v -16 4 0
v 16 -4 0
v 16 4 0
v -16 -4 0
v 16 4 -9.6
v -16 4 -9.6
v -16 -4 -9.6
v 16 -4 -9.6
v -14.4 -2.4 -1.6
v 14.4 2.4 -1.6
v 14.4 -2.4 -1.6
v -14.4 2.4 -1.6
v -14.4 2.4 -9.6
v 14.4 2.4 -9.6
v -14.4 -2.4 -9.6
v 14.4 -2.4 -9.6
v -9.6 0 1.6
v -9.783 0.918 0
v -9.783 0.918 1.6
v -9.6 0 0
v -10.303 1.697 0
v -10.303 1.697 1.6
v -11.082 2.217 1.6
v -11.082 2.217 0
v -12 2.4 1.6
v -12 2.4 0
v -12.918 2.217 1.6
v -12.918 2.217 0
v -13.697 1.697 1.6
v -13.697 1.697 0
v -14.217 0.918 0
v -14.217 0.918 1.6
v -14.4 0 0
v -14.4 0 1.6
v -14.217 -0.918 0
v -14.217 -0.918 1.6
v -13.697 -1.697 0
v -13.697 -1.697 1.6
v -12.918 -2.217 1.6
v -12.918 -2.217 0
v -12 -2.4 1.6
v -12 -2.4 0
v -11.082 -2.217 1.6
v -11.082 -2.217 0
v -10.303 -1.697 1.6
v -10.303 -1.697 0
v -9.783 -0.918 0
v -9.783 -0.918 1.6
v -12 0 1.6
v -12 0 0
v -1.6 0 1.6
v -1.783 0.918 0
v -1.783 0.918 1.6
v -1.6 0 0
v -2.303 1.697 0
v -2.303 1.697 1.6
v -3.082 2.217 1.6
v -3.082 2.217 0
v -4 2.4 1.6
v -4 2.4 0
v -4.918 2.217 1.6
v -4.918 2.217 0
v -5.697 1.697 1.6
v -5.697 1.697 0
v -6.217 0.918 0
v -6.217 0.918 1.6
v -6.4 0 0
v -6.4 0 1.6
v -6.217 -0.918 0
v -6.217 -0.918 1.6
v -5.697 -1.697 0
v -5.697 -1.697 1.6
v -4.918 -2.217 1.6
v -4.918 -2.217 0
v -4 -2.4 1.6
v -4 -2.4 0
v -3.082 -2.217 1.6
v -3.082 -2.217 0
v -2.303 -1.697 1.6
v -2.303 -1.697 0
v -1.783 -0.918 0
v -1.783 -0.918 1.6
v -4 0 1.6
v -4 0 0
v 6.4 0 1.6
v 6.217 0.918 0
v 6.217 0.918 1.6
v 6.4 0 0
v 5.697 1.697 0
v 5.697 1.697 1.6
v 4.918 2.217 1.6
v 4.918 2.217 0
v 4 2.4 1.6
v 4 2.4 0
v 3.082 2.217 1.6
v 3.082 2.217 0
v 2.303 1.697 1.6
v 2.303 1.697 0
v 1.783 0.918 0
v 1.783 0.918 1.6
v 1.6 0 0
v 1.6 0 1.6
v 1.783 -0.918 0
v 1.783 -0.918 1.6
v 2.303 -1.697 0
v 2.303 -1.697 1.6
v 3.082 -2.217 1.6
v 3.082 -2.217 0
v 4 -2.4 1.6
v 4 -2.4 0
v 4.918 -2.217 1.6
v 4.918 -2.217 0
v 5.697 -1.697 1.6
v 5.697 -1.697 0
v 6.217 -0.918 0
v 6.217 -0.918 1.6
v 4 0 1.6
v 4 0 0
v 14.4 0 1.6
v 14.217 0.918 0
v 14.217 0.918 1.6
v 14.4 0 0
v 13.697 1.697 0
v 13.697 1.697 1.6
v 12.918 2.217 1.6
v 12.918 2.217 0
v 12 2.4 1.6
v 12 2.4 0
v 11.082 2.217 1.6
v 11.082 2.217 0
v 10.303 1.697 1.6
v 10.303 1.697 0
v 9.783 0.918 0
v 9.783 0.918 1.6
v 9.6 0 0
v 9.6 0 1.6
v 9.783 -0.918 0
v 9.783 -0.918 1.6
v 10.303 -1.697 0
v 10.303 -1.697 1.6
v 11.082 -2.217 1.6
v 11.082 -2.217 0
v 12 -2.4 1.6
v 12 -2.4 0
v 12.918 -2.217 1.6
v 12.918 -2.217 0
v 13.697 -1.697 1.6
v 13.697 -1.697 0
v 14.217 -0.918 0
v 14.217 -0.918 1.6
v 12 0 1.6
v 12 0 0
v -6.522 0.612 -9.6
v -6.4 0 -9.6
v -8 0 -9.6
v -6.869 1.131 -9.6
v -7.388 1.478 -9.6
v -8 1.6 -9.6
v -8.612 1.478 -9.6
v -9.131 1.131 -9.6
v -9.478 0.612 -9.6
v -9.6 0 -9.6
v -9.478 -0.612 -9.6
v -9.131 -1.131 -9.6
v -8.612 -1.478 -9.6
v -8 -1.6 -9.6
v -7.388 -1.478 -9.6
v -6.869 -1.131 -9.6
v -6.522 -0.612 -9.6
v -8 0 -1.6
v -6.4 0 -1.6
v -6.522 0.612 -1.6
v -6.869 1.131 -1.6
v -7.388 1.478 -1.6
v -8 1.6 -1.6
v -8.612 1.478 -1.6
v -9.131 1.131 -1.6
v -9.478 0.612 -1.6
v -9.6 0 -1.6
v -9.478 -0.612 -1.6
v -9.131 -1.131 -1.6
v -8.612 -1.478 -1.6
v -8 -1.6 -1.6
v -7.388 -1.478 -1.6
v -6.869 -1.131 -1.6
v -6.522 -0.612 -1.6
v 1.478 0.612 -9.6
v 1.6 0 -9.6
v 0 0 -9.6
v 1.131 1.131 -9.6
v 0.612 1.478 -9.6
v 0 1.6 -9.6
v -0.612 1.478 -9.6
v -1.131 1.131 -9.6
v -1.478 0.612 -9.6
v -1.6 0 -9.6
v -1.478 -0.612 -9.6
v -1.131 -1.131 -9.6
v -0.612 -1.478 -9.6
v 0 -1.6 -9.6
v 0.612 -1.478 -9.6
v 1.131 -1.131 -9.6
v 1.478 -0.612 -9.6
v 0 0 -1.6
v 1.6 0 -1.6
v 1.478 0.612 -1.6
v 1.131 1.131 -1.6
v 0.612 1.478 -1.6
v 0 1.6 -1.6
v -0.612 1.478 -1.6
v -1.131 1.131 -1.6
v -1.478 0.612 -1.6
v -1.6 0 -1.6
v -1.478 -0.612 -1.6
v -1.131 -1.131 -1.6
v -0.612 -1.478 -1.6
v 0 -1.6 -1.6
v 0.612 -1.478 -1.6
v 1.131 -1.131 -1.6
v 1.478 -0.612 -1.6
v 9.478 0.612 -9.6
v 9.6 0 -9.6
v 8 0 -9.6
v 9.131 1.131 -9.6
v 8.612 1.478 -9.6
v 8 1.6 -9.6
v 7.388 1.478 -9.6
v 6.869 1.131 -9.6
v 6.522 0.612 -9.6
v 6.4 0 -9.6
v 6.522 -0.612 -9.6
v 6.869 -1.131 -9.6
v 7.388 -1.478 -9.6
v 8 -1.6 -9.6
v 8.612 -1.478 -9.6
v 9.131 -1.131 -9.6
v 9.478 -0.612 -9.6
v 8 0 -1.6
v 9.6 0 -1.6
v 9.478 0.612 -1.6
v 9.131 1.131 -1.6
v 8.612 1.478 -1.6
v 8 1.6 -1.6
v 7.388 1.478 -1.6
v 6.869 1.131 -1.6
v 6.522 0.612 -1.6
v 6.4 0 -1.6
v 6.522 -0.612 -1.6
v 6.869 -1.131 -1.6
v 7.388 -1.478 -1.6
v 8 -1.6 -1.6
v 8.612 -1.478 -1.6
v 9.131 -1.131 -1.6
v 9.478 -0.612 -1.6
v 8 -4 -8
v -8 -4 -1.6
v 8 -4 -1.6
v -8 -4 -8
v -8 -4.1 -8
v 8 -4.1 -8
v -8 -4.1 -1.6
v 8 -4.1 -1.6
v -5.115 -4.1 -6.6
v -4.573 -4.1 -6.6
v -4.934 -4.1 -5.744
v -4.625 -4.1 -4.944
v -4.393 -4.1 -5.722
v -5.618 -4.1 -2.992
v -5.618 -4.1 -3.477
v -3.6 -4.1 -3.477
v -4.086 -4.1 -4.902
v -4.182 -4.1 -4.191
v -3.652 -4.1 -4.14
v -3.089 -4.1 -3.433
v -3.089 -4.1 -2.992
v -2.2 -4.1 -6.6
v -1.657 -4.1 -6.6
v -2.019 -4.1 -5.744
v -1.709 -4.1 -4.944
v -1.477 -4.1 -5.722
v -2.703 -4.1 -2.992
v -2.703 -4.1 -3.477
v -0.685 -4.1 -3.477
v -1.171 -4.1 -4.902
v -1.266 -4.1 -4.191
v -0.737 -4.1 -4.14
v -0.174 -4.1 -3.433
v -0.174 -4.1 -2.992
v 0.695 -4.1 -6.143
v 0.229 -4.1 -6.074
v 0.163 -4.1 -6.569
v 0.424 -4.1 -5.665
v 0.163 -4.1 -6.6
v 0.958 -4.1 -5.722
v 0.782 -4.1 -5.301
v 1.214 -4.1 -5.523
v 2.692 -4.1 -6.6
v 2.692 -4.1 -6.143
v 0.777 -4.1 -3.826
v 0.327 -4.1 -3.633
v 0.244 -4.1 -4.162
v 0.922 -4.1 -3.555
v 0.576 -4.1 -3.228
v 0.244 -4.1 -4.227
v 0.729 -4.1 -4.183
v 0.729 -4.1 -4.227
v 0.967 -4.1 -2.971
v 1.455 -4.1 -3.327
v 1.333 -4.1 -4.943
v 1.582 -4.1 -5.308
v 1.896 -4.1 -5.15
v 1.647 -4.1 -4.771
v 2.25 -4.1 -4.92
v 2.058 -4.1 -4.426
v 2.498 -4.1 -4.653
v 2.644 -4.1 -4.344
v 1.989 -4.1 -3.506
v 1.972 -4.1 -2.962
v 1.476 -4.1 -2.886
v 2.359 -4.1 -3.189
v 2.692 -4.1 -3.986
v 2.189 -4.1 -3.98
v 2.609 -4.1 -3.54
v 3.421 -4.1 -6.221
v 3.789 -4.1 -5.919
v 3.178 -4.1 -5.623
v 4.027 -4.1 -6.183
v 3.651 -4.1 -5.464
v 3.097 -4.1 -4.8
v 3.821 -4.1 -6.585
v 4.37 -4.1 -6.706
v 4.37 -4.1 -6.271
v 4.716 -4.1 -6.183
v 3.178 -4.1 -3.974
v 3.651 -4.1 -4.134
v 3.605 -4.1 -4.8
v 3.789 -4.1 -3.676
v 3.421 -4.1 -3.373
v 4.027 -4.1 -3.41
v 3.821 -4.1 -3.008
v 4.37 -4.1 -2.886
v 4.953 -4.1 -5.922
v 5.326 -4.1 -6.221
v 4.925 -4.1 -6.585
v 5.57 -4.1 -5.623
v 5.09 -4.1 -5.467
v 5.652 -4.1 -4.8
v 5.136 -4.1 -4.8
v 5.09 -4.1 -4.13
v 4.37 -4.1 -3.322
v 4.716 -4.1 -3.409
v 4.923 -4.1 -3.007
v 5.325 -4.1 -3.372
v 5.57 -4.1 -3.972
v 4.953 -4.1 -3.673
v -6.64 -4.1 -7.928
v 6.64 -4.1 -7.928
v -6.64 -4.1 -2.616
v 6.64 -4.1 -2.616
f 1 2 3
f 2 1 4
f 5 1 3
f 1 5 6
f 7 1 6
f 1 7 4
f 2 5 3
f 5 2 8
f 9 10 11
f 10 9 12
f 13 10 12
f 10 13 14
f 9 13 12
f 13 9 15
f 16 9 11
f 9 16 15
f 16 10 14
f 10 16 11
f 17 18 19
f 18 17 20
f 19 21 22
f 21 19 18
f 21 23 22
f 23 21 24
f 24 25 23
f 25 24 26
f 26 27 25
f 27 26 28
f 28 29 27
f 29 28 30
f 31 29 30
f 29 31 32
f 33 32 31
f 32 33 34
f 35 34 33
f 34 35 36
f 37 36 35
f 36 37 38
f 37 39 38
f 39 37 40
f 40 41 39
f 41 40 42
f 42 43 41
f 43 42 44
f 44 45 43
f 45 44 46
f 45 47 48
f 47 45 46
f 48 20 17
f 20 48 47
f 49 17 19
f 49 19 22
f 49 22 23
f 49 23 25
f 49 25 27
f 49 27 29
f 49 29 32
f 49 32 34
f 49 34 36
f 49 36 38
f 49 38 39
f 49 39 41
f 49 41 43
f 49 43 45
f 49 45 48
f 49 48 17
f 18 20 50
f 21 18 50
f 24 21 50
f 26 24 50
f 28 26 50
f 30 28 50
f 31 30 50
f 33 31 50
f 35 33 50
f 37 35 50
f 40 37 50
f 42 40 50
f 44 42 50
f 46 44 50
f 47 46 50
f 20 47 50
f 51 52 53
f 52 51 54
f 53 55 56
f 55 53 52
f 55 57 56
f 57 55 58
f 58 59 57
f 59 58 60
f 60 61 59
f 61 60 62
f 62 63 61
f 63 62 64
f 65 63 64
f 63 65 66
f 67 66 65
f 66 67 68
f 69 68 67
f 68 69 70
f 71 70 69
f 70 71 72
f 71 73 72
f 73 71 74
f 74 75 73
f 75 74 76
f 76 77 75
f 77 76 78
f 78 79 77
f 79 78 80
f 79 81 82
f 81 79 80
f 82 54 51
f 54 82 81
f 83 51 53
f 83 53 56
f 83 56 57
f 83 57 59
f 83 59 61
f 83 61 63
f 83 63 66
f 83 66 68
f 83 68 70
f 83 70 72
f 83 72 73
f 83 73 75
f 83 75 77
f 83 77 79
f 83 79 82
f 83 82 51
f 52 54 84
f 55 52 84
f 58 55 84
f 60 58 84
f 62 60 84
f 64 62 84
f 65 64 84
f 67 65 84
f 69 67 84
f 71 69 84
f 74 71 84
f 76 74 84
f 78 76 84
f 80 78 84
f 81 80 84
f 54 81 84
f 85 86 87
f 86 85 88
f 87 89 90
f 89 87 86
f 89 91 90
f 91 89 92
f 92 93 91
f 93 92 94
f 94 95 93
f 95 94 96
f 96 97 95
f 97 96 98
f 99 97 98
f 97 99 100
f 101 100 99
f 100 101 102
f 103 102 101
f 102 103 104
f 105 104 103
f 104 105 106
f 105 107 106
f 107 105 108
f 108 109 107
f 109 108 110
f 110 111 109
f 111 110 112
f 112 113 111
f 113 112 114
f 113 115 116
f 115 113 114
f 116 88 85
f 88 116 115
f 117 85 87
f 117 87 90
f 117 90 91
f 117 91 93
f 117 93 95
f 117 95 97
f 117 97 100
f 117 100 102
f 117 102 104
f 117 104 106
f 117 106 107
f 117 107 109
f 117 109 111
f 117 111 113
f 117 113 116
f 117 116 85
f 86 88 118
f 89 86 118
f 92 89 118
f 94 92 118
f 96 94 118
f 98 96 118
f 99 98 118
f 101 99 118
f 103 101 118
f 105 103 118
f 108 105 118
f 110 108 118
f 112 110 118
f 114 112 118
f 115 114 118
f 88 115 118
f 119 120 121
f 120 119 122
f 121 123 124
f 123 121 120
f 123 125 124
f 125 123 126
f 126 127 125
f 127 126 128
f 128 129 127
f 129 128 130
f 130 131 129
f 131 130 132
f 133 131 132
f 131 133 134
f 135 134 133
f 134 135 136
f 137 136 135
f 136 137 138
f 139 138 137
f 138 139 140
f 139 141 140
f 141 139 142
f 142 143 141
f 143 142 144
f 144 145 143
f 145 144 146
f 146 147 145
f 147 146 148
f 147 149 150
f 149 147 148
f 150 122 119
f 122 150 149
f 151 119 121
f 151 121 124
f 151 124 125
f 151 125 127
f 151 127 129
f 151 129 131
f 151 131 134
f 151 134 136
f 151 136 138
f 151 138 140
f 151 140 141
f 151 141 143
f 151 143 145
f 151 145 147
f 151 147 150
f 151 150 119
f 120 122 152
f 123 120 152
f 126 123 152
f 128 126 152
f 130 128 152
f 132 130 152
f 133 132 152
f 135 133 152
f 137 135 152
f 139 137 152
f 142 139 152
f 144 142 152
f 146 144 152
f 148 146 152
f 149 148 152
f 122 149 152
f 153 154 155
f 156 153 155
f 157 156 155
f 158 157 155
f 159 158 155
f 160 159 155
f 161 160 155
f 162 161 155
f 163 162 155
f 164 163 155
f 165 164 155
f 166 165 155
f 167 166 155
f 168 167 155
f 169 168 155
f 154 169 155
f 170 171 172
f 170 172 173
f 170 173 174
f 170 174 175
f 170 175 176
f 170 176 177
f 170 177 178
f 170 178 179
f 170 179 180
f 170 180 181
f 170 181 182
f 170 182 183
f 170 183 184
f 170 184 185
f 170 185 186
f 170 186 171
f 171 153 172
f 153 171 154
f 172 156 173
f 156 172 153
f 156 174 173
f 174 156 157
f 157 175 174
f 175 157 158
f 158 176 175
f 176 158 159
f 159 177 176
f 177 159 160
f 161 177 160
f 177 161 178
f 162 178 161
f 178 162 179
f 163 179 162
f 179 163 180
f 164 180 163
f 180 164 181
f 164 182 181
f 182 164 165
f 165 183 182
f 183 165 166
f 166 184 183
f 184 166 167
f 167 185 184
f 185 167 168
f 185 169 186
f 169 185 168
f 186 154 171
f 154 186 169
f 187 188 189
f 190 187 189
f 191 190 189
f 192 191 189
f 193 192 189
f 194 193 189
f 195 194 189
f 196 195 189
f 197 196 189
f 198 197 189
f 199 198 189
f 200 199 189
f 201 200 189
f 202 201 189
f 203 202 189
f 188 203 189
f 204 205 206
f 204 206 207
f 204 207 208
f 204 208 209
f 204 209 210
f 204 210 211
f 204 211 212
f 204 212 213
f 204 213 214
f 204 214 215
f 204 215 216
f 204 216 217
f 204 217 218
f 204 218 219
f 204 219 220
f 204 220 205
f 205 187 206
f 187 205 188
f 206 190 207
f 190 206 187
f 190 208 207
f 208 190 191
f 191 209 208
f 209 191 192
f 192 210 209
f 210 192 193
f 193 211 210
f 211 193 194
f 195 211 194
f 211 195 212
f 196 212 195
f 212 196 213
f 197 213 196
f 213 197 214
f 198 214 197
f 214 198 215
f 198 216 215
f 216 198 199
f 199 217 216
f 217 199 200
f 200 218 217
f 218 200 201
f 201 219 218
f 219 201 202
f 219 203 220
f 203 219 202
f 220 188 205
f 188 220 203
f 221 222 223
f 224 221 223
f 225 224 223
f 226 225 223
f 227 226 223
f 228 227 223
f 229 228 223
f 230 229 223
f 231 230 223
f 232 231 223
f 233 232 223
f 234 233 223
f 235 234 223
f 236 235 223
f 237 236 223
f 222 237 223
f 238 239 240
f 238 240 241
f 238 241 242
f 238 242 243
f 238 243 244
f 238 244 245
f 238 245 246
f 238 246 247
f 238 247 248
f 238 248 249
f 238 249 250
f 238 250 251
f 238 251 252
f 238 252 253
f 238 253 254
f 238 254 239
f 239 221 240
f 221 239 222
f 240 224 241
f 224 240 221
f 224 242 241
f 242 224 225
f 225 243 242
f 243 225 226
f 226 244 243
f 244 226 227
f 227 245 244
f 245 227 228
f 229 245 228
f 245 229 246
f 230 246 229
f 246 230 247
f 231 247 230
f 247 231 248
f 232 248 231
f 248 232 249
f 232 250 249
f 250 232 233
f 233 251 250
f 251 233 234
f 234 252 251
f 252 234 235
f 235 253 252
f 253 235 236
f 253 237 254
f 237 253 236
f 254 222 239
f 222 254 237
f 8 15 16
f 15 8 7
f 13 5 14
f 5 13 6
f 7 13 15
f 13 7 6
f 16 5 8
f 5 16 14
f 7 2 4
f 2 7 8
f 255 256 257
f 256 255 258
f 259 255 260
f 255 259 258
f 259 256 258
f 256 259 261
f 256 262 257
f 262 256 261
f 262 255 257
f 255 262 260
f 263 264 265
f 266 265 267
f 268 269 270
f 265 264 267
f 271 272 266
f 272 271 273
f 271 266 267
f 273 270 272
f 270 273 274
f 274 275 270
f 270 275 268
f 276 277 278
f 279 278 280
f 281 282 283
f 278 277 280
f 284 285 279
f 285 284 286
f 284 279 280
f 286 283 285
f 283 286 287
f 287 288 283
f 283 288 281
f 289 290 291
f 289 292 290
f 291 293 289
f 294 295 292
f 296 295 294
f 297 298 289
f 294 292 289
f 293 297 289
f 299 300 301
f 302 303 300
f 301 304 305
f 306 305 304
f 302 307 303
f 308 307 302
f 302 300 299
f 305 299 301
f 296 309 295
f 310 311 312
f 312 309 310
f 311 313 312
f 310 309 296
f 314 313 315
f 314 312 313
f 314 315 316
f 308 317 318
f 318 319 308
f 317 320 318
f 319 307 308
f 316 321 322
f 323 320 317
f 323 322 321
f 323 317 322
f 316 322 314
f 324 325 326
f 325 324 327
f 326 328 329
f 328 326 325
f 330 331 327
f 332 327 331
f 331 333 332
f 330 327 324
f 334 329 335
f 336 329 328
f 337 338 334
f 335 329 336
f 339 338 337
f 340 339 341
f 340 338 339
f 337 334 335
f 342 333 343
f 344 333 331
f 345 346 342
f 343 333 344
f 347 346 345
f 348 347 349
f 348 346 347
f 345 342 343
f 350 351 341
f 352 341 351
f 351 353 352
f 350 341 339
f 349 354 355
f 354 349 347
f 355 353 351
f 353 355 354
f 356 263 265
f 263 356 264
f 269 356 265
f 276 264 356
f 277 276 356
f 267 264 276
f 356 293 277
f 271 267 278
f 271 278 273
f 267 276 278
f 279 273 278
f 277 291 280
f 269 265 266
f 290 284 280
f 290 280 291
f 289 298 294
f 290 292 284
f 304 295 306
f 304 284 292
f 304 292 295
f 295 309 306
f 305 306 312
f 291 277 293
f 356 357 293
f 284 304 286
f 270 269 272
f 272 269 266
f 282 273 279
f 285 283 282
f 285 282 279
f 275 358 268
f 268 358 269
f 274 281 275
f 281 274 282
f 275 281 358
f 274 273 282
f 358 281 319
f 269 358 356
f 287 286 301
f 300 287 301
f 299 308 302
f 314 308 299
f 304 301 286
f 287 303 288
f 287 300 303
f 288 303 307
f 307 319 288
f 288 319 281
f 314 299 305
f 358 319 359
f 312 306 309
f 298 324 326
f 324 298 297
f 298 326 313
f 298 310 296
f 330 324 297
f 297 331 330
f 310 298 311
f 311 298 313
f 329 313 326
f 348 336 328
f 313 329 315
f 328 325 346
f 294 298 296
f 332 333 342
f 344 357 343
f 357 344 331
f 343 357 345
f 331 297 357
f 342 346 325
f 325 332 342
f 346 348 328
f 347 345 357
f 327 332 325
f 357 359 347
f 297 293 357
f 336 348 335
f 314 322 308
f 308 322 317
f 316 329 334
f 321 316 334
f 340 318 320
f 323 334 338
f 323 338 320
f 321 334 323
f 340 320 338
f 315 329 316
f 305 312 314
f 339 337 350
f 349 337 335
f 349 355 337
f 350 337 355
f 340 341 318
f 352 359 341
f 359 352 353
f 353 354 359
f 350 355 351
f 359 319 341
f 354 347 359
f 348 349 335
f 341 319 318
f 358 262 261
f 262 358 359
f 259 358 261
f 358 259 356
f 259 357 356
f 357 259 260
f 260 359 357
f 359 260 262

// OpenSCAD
// file: ../p/4-4edge.scad
use <../lib.scad>
function ldraw_lib__4_4edge() = [
// 0 Circle 1.0
// 0 Name: 4-4edge.dat
// 0 Author: James Jessiman
// 0 !LDRAW_ORG Primitive UPDATE 2017-01
// 0 !LICENSE Licensed under CC BY 2.0 and CC BY 4.0 : see CAreadme.txt
// 
// 0 BFC CERTIFY CCW
  [0,"BFC","CERTIFY"],
  [0,"BFC","CCW"],
// 
// 0 !HISTORY 1998-12-15 [PTadmin] Official Update 1998-10
// 0 !HISTORY 2005-12-28 [PTadmin] Official Update 2005-01
// 0 !HISTORY 2007-06-24 [PTadmin] Header formatted for Contributor Agreement
// 0 !HISTORY 2008-07-01 [PTadmin] Official Update 2008-01
// 0 !HISTORY 2017-01-15 [Steffen] BFCed
// 0 !HISTORY 2017-12-30 [PTadmin] Official Update 2017-01
// 
// 
// 2 24 1 0 0 0.9239 0 0.3827
  [2,24,1,0,0,0.9239,0,0.3827],
// 2 24 0.9239 0 0.3827 0.7071 0 0.7071
  [2,24,0.9239,0,0.3827,0.7071,0,0.7071],
// 2 24 0.7071 0 0.7071 0.3827 0 0.9239
  [2,24,0.7071,0,0.7071,0.3827,0,0.9239],
// 2 24 0.3827 0 0.9239 0 0 1
  [2,24,0.3827,0,0.9239,0,0,1],
// 2 24 0 0 1 -0.3827 0 0.9239
  [2,24,0,0,1,-0.3827,0,0.9239],
// 2 24 -0.3827 0 0.9239 -0.7071 0 0.7071
  [2,24,-0.3827,0,0.9239,-0.7071,0,0.7071],
// 2 24 -0.7071 0 0.7071 -0.9239 0 0.3827
  [2,24,-0.7071,0,0.7071,-0.9239,0,0.3827],
// 2 24 -0.9239 0 0.3827 -1 0 -0
  [2,24,-0.9239,0,0.3827,-1,0,-0],
// 2 24 -1 0 -0 -0.9239 0 -0.3827
  [2,24,-1,0,-0,-0.9239,0,-0.3827],
// 2 24 -0.9239 0 -0.3827 -0.7071 0 -0.7071
  [2,24,-0.9239,0,-0.3827,-0.7071,0,-0.7071],
// 2 24 -0.7071 0 -0.7071 -0.3827 0 -0.9239
  [2,24,-0.7071,0,-0.7071,-0.3827,0,-0.9239],
// 2 24 -0.3827 0 -0.9239 0 0 -1
  [2,24,-0.3827,0,-0.9239,0,0,-1],
// 2 24 0 0 -1 0.3827 0 -0.9239
  [2,24,0,0,-1,0.3827,0,-0.9239],
// 2 24 0.3827 0 -0.9239 0.7071 0 -0.7071
  [2,24,0.3827,0,-0.9239,0.7071,0,-0.7071],
// 2 24 0.7071 0 -0.7071 0.9239 0 -0.3827
  [2,24,0.7071,0,-0.7071,0.9239,0,-0.3827],
// 2 24 0.9239 0 -0.3827 1 0 0
  [2,24,0.9239,0,-0.3827,1,0,0],
];
module ldraw_lib__4_4edge(step=0, col=false, unit=2/5, alt=false, line=0.2, solid=!$preview)
    makepoly(ldraw_lib__4_4edge(), step=step, col=col, unit=unit, alt=alt, line=line, solid=solid);
ldraw_lib__4_4edge(line=0.2);
// file: ../p/4-4disc.scad
use <../lib.scad>
function ldraw_lib__4_4disc() = [
// 0 Disc 1.0
// 0 Name: 4-4disc.dat
// 0 Author: James Jessiman
// 0 !LDRAW_ORG Primitive UPDATE 2002-02
// 0 !LICENSE Licensed under CC BY 2.0 and CC BY 4.0 : see CAreadme.txt
// 
// 0 BFC CERTIFY CCW
  [0,"BFC","CERTIFY"],
  [0,"BFC","CCW"],
// 
// 0 !HISTORY 1998-12-15 [PTadmin] Official Update 1998-10
// 0 !HISTORY 2002-03-23 [sbliss] Added BFC statement
// 0 !HISTORY 2002-04-25 [PTadmin] Official Update 2002-02
// 0 !HISTORY 2007-06-24 [PTadmin] Header formatted for Contributor Agreement
// 0 !HISTORY 2008-07-01 [PTadmin] Official Update 2008-01
// 
// 
// 3 16 0 0 0 1 0 0 0.9239 0 0.3827
  [3,16,0,0,0,1,0,0,0.9239,0,0.3827],
// 3 16 0 0 0 0.9239 0 0.3827 0.7071 0 0.7071
  [3,16,0,0,0,0.9239,0,0.3827,0.7071,0,0.7071],
// 3 16 0 0 0 0.7071 0 0.7071 0.3827 0 0.9239
  [3,16,0,0,0,0.7071,0,0.7071,0.3827,0,0.9239],
// 3 16 0 0 0 0.3827 0 0.9239 0 0 1
  [3,16,0,0,0,0.3827,0,0.9239,0,0,1],
// 3 16 0 0 0 0 0 1 -0.3827 0 0.9239
  [3,16,0,0,0,0,0,1,-0.3827,0,0.9239],
// 3 16 0 0 0 -0.3827 0 0.9239 -0.7071 0 0.7071
  [3,16,0,0,0,-0.3827,0,0.9239,-0.7071,0,0.7071],
// 3 16 0 0 0 -0.7071 0 0.7071 -0.9239 0 0.3827
  [3,16,0,0,0,-0.7071,0,0.7071,-0.9239,0,0.3827],
// 3 16 0 0 0 -0.9239 0 0.3827 -1 0 -0
  [3,16,0,0,0,-0.9239,0,0.3827,-1,0,-0],
// 3 16 0 0 0 -1 0 -0 -0.9239 0 -0.3827
  [3,16,0,0,0,-1,0,-0,-0.9239,0,-0.3827],
// 3 16 0 0 0 -0.9239 0 -0.3827 -0.7071 0 -0.7071
  [3,16,0,0,0,-0.9239,0,-0.3827,-0.7071,0,-0.7071],
// 3 16 0 0 0 -0.7071 0 -0.7071 -0.3827 0 -0.9239
  [3,16,0,0,0,-0.7071,0,-0.7071,-0.3827,0,-0.9239],
// 3 16 0 0 0 -0.3827 0 -0.9239 0 0 -1
  [3,16,0,0,0,-0.3827,0,-0.9239,0,0,-1],
// 3 16 0 0 0 0 0 -1 0.3827 0 -0.9239
  [3,16,0,0,0,0,0,-1,0.3827,0,-0.9239],
// 3 16 0 0 0 0.3827 0 -0.9239 0.7071 0 -0.7071
  [3,16,0,0,0,0.3827,0,-0.9239,0.7071,0,-0.7071],
// 3 16 0 0 0 0.7071 0 -0.7071 0.9239 0 -0.3827
  [3,16,0,0,0,0.7071,0,-0.7071,0.9239,0,-0.3827],
// 3 16 0 0 0 0.9239 0 -0.3827 1 0 0
  [3,16,0,0,0,0.9239,0,-0.3827,1,0,0],
// 0
];
module ldraw_lib__4_4disc(step=0, col=false, unit=2/5, alt=false, line=0.2, solid=!$preview)
    makepoly(ldraw_lib__4_4disc(), step=step, col=col, unit=unit, alt=alt, line=line, solid=solid);
ldraw_lib__4_4disc(line=0.2);
// file: ../p/4-4cyli.scad
use <../lib.scad>
$fa=1; $fs=0.2;
function ldraw_lib__4_4cyli(realsolid=false) = [
// 0 Cylinder 1.0
// 0 Name: 4-4cyli.dat
// 0 Author: James Jessiman
// 0 !LDRAW_ORG Primitive UPDATE 2005-01
// 0 !LICENSE Licensed under CC BY 2.0 and CC BY 4.0 : see CAreadme.txt
// 
// 0 BFC CERTIFY CCW
  [0,"BFC","CERTIFY"],
  [0,"BFC","CCW"],
// 
// 0 !HISTORY 1998-12-15 [PTadmin] Official Update 1998-10
// 0 !HISTORY 2002-03-23 [sbliss] Added BFC statement; merged headers from files in distributions LDraw 0.27 and Complete.
// 0 !HISTORY 2002-04-25 [PTadmin] Official Update 2002-02
// 0 !HISTORY 2004-12-14 [guyvivan] BFC CCW
// 0 !HISTORY 2005-12-28 [PTadmin] Official Update 2005-01
// 0 !HISTORY 2007-06-24 [PTadmin] Header formatted for Contributor Agreement
// 0 !HISTORY 2008-07-01 [PTadmin] Official Update 2008-01
// 
// 
// 4 16 1 1 0 0.9239 1 0.3827 0.9239 0 0.3827 1 0 0
  [4,16,1,1,0,0.9239,1,0.3827,0.9239,0,0.3827,1,0,0],
// 5 24 1 0 0 1 1 0 0.9239 0 0.3827 0.9239 0 -0.3827
  [5,24,1,0,0,1,1,0,0.9239,0,0.3827,0.9239,0,-0.3827],
// 4 16 0.9239 1 0.3827 0.7071 1 0.7071 0.7071 0 0.7071 0.9239 0 0.3827
  [4,16,0.9239,1,0.3827,0.7071,1,0.7071,0.7071,0,0.7071,0.9239,0,0.3827],
// 5 24 0.9239 0 0.3827 0.9239 1 0.3827 0.7071 0 0.7071 1 0 0
  [5,24,0.9239,0,0.3827,0.9239,1,0.3827,0.7071,0,0.7071,1,0,0],
// 4 16 0.7071 1 0.7071 0.3827 1 0.9239 0.3827 0 0.9239 0.7071 0 0.7071
  [4,16,0.7071,1,0.7071,0.3827,1,0.9239,0.3827,0,0.9239,0.7071,0,0.7071],
// 5 24 0.7071 0 0.7071 0.7071 1 0.7071 0.3827 0 0.9239 0.9239 0 0.3827
  [5,24,0.7071,0,0.7071,0.7071,1,0.7071,0.3827,0,0.9239,0.9239,0,0.3827],
// 4 16 0.3827 1 0.9239 0 1 1 0 0 1 0.3827 0 0.9239
  [4,16,0.3827,1,0.9239,0,1,1,0,0,1,0.3827,0,0.9239],
// 5 24 0.3827 0 0.9239 0.3827 1 0.9239 0 0 1 0.7071 0 0.7071
  [5,24,0.3827,0,0.9239,0.3827,1,0.9239,0,0,1,0.7071,0,0.7071],
// 4 16 0 1 1 -0.3827 1 0.9239 -0.3827 0 0.9239 0 0 1
  [4,16,0,1,1,-0.3827,1,0.9239,-0.3827,0,0.9239,0,0,1],
// 5 24 0 0 1 0 1 1 -0.3827 0 0.9239 0.3827 0 0.9239
  [5,24,0,0,1,0,1,1,-0.3827,0,0.9239,0.3827,0,0.9239],
// 4 16 -0.3827 1 0.9239 -0.7071 1 0.7071 -0.7071 0 0.7071 -0.3827 0 0.9239
  [4,16,-0.3827,1,0.9239,-0.7071,1,0.7071,-0.7071,0,0.7071,-0.3827,0,0.9239],
// 5 24 -0.3827 0 0.9239 -0.3827 1 0.9239 -0.7071 0 0.7071 0 0 1
  [5,24,-0.3827,0,0.9239,-0.3827,1,0.9239,-0.7071,0,0.7071,0,0,1],
// 4 16 -0.7071 1 0.7071 -0.9239 1 0.3827 -0.9239 0 0.3827 -0.7071 0 0.7071
  [4,16,-0.7071,1,0.7071,-0.9239,1,0.3827,-0.9239,0,0.3827,-0.7071,0,0.7071],
// 5 24 -0.7071 0 0.7071 -0.7071 1 0.7071 -0.9239 0 0.3827 -0.3827 0 0.9239
  [5,24,-0.7071,0,0.7071,-0.7071,1,0.7071,-0.9239,0,0.3827,-0.3827,0,0.9239],
// 4 16 -0.9239 1 0.3827 -1 1 0 -1 0 0 -0.9239 0 0.3827
  [4,16,-0.9239,1,0.3827,-1,1,0,-1,0,0,-0.9239,0,0.3827],
// 5 24 -0.9239 0 0.3827 -0.9239 1 0.3827 -1 0 0 -0.7071 0 0.7071
  [5,24,-0.9239,0,0.3827,-0.9239,1,0.3827,-1,0,0,-0.7071,0,0.7071],
// 4 16 -1 1 0 -0.9239 1 -0.3827 -0.9239 0 -0.3827 -1 0 0
  [4,16,-1,1,0,-0.9239,1,-0.3827,-0.9239,0,-0.3827,-1,0,0],
// 5 24 -1 0 0 -1 1 0 -0.9239 0 -0.3827 -0.9239 0 0.3827
  [5,24,-1,0,0,-1,1,0,-0.9239,0,-0.3827,-0.9239,0,0.3827],
// 4 16 -0.9239 1 -0.3827 -0.7071 1 -0.7071 -0.7071 0 -0.7071 -0.9239 0 -0.3827
  [4,16,-0.9239,1,-0.3827,-0.7071,1,-0.7071,-0.7071,0,-0.7071,-0.9239,0,-0.3827],
// 5 24 -0.9239 0 -0.3827 -0.9239 1 -0.3827 -0.7071 0 -0.7071 -1 0 0
  [5,24,-0.9239,0,-0.3827,-0.9239,1,-0.3827,-0.7071,0,-0.7071,-1,0,0],
// 4 16 -0.7071 1 -0.7071 -0.3827 1 -0.9239 -0.3827 0 -0.9239 -0.7071 0 -0.7071
  [4,16,-0.7071,1,-0.7071,-0.3827,1,-0.9239,-0.3827,0,-0.9239,-0.7071,0,-0.7071],
// 5 24 -0.7071 0 -0.7071 -0.7071 1 -0.7071 -0.3827 0 -0.9239 -0.9239 0 -0.3827
  [5,24,-0.7071,0,-0.7071,-0.7071,1,-0.7071,-0.3827,0,-0.9239,-0.9239,0,-0.3827],
// 4 16 -0.3827 1 -0.9239 0 1 -1 0 0 -1 -0.3827 0 -0.9239
  [4,16,-0.3827,1,-0.9239,0,1,-1,0,0,-1,-0.3827,0,-0.9239],
// 5 24 -0.3827 0 -0.9239 -0.3827 1 -0.9239 0 0 -1 -0.7071 0 -0.7071
  [5,24,-0.3827,0,-0.9239,-0.3827,1,-0.9239,0,0,-1,-0.7071,0,-0.7071],
// 4 16 0 1 -1 0.3827 1 -0.9239 0.3827 0 -0.9239 0 0 -1
  [4,16,0,1,-1,0.3827,1,-0.9239,0.3827,0,-0.9239,0,0,-1],
// 5 24 0 0 -1 0 1 -1 0.3827 0 -0.9239 -0.3827 0 -0.9239
  [5,24,0,0,-1,0,1,-1,0.3827,0,-0.9239,-0.3827,0,-0.9239],
// 4 16 0.3827 1 -0.9239 0.7071 1 -0.7071 0.7071 0 -0.7071 0.3827 0 -0.9239
  [4,16,0.3827,1,-0.9239,0.7071,1,-0.7071,0.7071,0,-0.7071,0.3827,0,-0.9239],
// 5 24 0.3827 0 -0.9239 0.3827 1 -0.9239 0.7071 0 -0.7071 0 0 -1
  [5,24,0.3827,0,-0.9239,0.3827,1,-0.9239,0.7071,0,-0.7071,0,0,-1],
// 4 16 0.7071 1 -0.7071 0.9239 1 -0.3827 0.9239 0 -0.3827 0.7071 0 -0.7071
  [4,16,0.7071,1,-0.7071,0.9239,1,-0.3827,0.9239,0,-0.3827,0.7071,0,-0.7071],
// 5 24 0.7071 0 -0.7071 0.7071 1 -0.7071 0.9239 0 -0.3827 0.3827 0 -0.9239
  [5,24,0.7071,0,-0.7071,0.7071,1,-0.7071,0.9239,0,-0.3827,0.3827,0,-0.9239],
// 4 16 0.9239 1 -0.3827 1 1 0 1 0 0 0.9239 0 -0.3827
  [4,16,0.9239,1,-0.3827,1,1,0,1,0,0,0.9239,0,-0.3827],
// 5 24 0.9239 0 -0.3827 0.9239 1 -0.3827 1 0 0 0.7071 0 -0.7071
  [5,24,0.9239,0,-0.3827,0.9239,1,-0.3827,1,0,0,0.7071,0,-0.7071],
// 0
];
module ldraw_lib__4_4cyli(step=0, col=false, unit=2/5, alt=false, line=0.2, solid=!$preview)
    makepoly(ldraw_lib__4_4cyli(solid), step=step, col=col, unit=unit, alt=alt, line=line, solid=solid);
ldraw_lib__4_4cyli(line=0.2);
// file: ../p/stud3.scad
use <../lib.scad>
use <4-4cyli.scad>
use <4-4disc.scad>
use <4-4edge.scad>
function ldraw_lib__stud3() = [
// 0 Stud Tube Solid
// 0 Name: stud3.dat
// 0 Author: James Jessiman
// 0 !LDRAW_ORG Primitive UPDATE 2012-01
// 0 !LICENSE Licensed under CC BY 4.0 : see CAreadme.txt
// 
// 0 BFC CERTIFY CCW
  [0,"BFC","CERTIFY"],
  [0,"BFC","CCW"],
// 
// 0 !HISTORY 2002-04-04 [sbliss] Modified for BFC compliance
// 0 !HISTORY 2002-04-25 [PTadmin] Official Update 2002-02
// 0 !HISTORY 2007-06-24 [PTadmin] Header formatted for Contributor Agreement
// 0 !HISTORY 2008-07-01 [PTadmin] Official Update 2008-01
// 0 !HISTORY 2012-02-16 [Philo] Changed to CCW
// 0 !HISTORY 2012-03-30 [PTadmin] Official Update 2012-01
// 
// 
// 1 16 0 -4 0 4 0 0 0 1 0 0 0 4 4-4edge.dat
  [1,16,0,-4,0,4,0,0,0,1,0,0,0,4, ldraw_lib__4_4edge()],
// 1 16 0 0 0 4 0 0 0 1 0 0 0 4 4-4edge.dat
  [1,16,0,0,0,4,0,0,0,1,0,0,0,4, ldraw_lib__4_4edge()],
// 1 16 0 -4 0 4 0 0 0 1 0 0 0 4 4-4disc.dat
  [1,16,0,-4,0,4,0,0,0,1,0,0,0,4, ldraw_lib__4_4disc()],
  [-1,16,0,0,0,4,0,0,0,-1,0,0,0,4, ldraw_lib__4_4disc()],
// 1 16 0 -4 0 4 0 0 0 4 0 0 0 4 4-4cyli.dat
  [1,16,0,-4,0,4,0,0,0,4,0,0,0,4, ldraw_lib__4_4cyli()],
];
module ldraw_lib__stud3(step=0, col=false, unit=2/5, alt=false, line=0.2, solid=!$preview)
    makepoly(ldraw_lib__stud3(), step=step, col=col, unit=unit, alt=alt, line=line, solid=solid);
ldraw_lib__stud3(line=0.2);
// file: ../p/stud.scad
use <../lib.scad>
use <4-4cyli.scad>
use <4-4disc.scad>
use <4-4edge.scad>
function ldraw_lib__stud() = [
// 0 Stud
// 0 Name: stud.dat
// 0 Author: James Jessiman
// 0 !LDRAW_ORG Primitive UPDATE 2012-01
// 0 !LICENSE Licensed under CC BY 4.0 : see CAreadme.txt
// 
// 0 BFC CERTIFY CCW
  [0,"BFC","CERTIFY"],
  [0,"BFC","CCW"],
// 
// 0 !HISTORY 2002-04-04 [sbliss] Modified for BFC compliance
// 0 !HISTORY 2002-04-25 [PTadmin] Official Update 2002-02
// 0 !HISTORY 2007-06-24 [PTadmin] Header formatted for Contributor Agreement
// 0 !HISTORY 2008-07-01 [PTadmin] Official Update 2008-01
// 0 !HISTORY 2012-02-16 [Philo] Changed to CCW
// 0 !HISTORY 2012-03-30 [PTadmin] Official Update 2012-01
// 
// 
// 1 16 0 0 0 6 0 0 0 1 0 0 0 6 4-4edge.dat
  [1,16,0,0,0,6,0,0,0,1,0,0,0,6, ldraw_lib__4_4edge()],
// 1 16 0 -4 0 6 0 0 0 1 0 0 0 6 4-4edge.dat
  [1,16,0,-4,0,6,0,0,0,1,0,0,0,6, ldraw_lib__4_4edge()],
// 1 16 0 0 0 6 0 0 0 -4 0 0 0 6 4-4cyli.dat
  [1,16,0,0,0,6,0,0,0,-4,0,0,0,6, ldraw_lib__4_4cyli()],
// 1 16 0 -4 0 6 0 0 0 1 0 0 0 6 4-4disc.dat
  [1,16,0,-4,0,6,0,0,0,1,0,0,0,6, ldraw_lib__4_4disc()],
  [-1,16,0,0,0,6,0,0,0,-1,0,0,0,6, ldraw_lib__4_4disc()],
];
module ldraw_lib__stud(step=0, col=false, unit=2/5, alt=false, line=0.2, solid=!$preview)
    makepoly(ldraw_lib__stud(), step=step, col=col, unit=unit, alt=alt, line=line, solid=solid);
ldraw_lib__stud(line=0.2);
// file: ../p/box5.scad
use <../lib.scad>
function ldraw_lib__box5() = [
// 0 Box with 5 Faces and All Edges
// 0 Name: box5.dat
// 0 Author: James Jessiman
// 0 !LDRAW_ORG Primitive UPDATE 2012-01
// 0 !LICENSE Licensed under CC BY 2.0 and CC BY 4.0 : see CAreadme.txt
// 
// 0 BFC CERTIFY CCW
  [0,"BFC","CERTIFY"],
  [0,"BFC","CCW"],
// 
// 0 !HISTORY 2002-04-03 [sbliss] Modified for BFC compliance
// 0 !HISTORY 2002-04-25 [PTadmin] Official Update 2002-02
// 0 !HISTORY 2007-06-24 [PTadmin] Header formatted for Contributor Agreement
// 0 !HISTORY 2008-07-01 [PTadmin] Official Update 2008-01
// 0 !HISTORY 2012-02-16 [Philo] Changed to CCW
// 0 !HISTORY 2012-03-30 [PTadmin] Official Update 2012-01
// 
// 
// 2 24 1 1 1 -1 1 1
  [2,24,1,1,1,-1,1,1],
// 2 24 -1 1 1 -1 1 -1
  [2,24,-1,1,1,-1,1,-1],
// 2 24 -1 1 -1 1 1 -1
  [2,24,-1,1,-1,1,1,-1],
// 2 24 1 1 -1 1 1 1
  [2,24,1,1,-1,1,1,1],
// 2 24 1 0 1 -1 0 1
  [2,24,1,0,1,-1,0,1],
// 2 24 -1 0 1 -1 0 -1
  [2,24,-1,0,1,-1,0,-1],
// 2 24 -1 0 -1 1 0 -1
  [2,24,-1,0,-1,1,0,-1],
// 2 24 1 0 -1 1 0 1
  [2,24,1,0,-1,1,0,1],
// 2 24 1 0 1 1 1 1
  [2,24,1,0,1,1,1,1],
// 2 24 -1 0 1 -1 1 1
  [2,24,-1,0,1,-1,1,1],
// 2 24 1 0 -1 1 1 -1
  [2,24,1,0,-1,1,1,-1],
// 2 24 -1 0 -1 -1 1 -1
  [2,24,-1,0,-1,-1,1,-1],
// 4 16 -1 1 1 1 1 1 1 1 -1 -1 1 -1
  [4,16,-1,1,1,1,1,1,1,1,-1,-1,1,-1],
// 4 16 -1 1 1 -1 0 1 1 0 1 1 1 1
  [4,16,-1,1,1,-1,0,1,1,0,1,1,1,1],
// 4 16 -1 1 -1 -1 0 -1 -1 0 1 -1 1 1
  [4,16,-1,1,-1,-1,0,-1,-1,0,1,-1,1,1],
// 4 16 1 1 -1 1 0 -1 -1 0 -1 -1 1 -1
  [4,16,1,1,-1,1,0,-1,-1,0,-1,-1,1,-1],
// 4 16 1 1 1 1 0 1 1 0 -1 1 1 -1
  [4,16,1,1,1,1,0,1,1,0,-1,1,1,-1],
];
makepoly(ldraw_lib__box5(), line=0.2);
// file: ../p/box4t.scad
use <../lib.scad>
function ldraw_lib__box4t() = [
// 0 Box with 4 Adjacent Faces and All Edges
// 0 Name: box4t.dat
// 0 Author: Tore Eriksson [Tore_Eriksson]
// 0 !LDRAW_ORG Primitive UPDATE 2003-02
// 0 !LICENSE Licensed under CC BY 2.0 and CC BY 4.0 : see CAreadme.txt
// 
// 0 BFC CERTIFY CCW
  [0,"BFC","CERTIFY"],
  [0,"BFC","CCW"],
// 
// 0 !HISTORY 1997-09-29 [PTadmin] Official Update 1997-15
// 0 !HISTORY 2002-08-31 [izanette] Modified with WINDZ for BFC compliance
// 0 !HISTORY 2003-08-01 [PTadmin] Official Update 2003-02
// 0 !HISTORY 2007-06-24 [PTadmin] Header formatted for Contributor Agreement
// 0 !HISTORY 2008-07-01 [PTadmin] Official Update 2008-01
// 
// 
// 2 24 1 1 1 -1 1 1
  [2,24,1,1,1,-1,1,1],
// 2 24 -1 1 1 -1 1 -1
  [2,24,-1,1,1,-1,1,-1],
// 2 24 -1 1 -1 1 1 -1
  [2,24,-1,1,-1,1,1,-1],
// 2 24 1 1 -1 1 1 1
  [2,24,1,1,-1,1,1,1],
// 2 24 1 0 1 -1 0 1
  [2,24,1,0,1,-1,0,1],
// 2 24 -1 0 1 -1 0 -1
  [2,24,-1,0,1,-1,0,-1],
// 2 24 -1 0 -1 1 0 -1
  [2,24,-1,0,-1,1,0,-1],
// 2 24 1 0 -1 1 0 1
  [2,24,1,0,-1,1,0,1],
// 2 24 1 0 1 1 1 1
  [2,24,1,0,1,1,1,1],
// 2 24 -1 0 1 -1 1 1
  [2,24,-1,0,1,-1,1,1],
// 2 24 1 0 -1 1 1 -1
  [2,24,1,0,-1,1,1,-1],
// 2 24 -1 0 -1 -1 1 -1
  [2,24,-1,0,-1,-1,1,-1],
// 4 16 1 1 1 1 1 -1 -1 1 -1 -1 1 1
  [4,16,1,1,1,1,1,-1,-1,1,-1,-1,1,1],
// 4 16 1 1 1 -1 1 1 -1 0 1 1 0 1
  [4,16,1,1,1,-1,1,1,-1,0,1,1,0,1],
// 4 16 -1 1 1 -1 1 -1 -1 0 -1 -1 0 1
  [4,16,-1,1,1,-1,1,-1,-1,0,-1,-1,0,1],
// 0 4 16 -1 1 -1 -1 0 -1 1 0 -1 1 1 -1
// 4 16 1 1 -1 1 1 1 1 0 1 1 0 -1
  [4,16,1,1,-1,1,1,1,1,0,1,1,0,-1],
// 0
];
makepoly(ldraw_lib__box4t(), line=0.2);
// file: s/3010s01.scad
use <../../lib.scad>
use <../../p/box4t.scad>
use <../../p/box5.scad>
use <../../p/stud.scad>
use <../../p/stud3.scad>
$fa=1; $fs=0.2;
function ldraw_lib__s__3010s01(realsolid=false) = [
// 0 ~Brick  1 x  4 without Front Face
// 0 Name: s\3010s01.dat
// 0 Author: Tony Hafner [hafhead]
// 0 !LDRAW_ORG Subpart UPDATE 2003-02
// 0 !LICENSE Licensed under CC BY 2.0 and CC BY 4.0 : see CAreadme.txt
// 
// 0 BFC CERTIFY CW
  [0,"BFC","CERTIFY"],
  [0,"BFC","CW"],
// 
// 0 !HISTORY 2003-08-01 [PTadmin] Official Update 2003-02
// 0 !HISTORY 2007-08-29 [PTadmin] Header formatted for Contributor Agreement
// 0 !HISTORY 2008-07-01 [PTadmin] Official Update 2008-01
// 
// 
// 1 16 0 24 0 40 0 0 0 -24 0 0 0 10 box4t.dat
  [1,16,0,24,0,40,0,0,0,-24,0,0,0,10, ldraw_lib__box4t(realsolid)],
// 0 BFC INVERTNEXT
  [0,"BFC","INVERTNEXT"],
// 1 16 0 24 0 36 0 0 0 -20 0 0 0 6 box5.dat
  [1,16,0,24,0,36,0,0,0,-20,0,0,0,6, ldraw_lib__box5(realsolid)],
// 1 16 -30 0 0 1 0 0 0 1 0 0 0 1 stud.dat
  [1,16,-30,0,0,1,0,0,0,1,0,0,0,1, ldraw_lib__stud(realsolid)],
// 1 16 -10 0 0 1 0 0 0 1 0 0 0 1 stud.dat
  [1,16,-10,0,0,1,0,0,0,1,0,0,0,1, ldraw_lib__stud(realsolid)],
// 1 16 10 0 0 1 0 0 0 1 0 0 0 1 stud.dat
  [1,16,10,0,0,1,0,0,0,1,0,0,0,1, ldraw_lib__stud(realsolid)],
// 1 16 30 0 0 1 0 0 0 1 0 0 0 1 stud.dat
  [1,16,30,0,0,1,0,0,0,1,0,0,0,1, ldraw_lib__stud(realsolid)],
// 1 16 -20 4 0 1 0 0 0 -5 0 0 0 1 stud3.dat
  [1,16,-20,4,0,1,0,0,0,-5,0,0,0,1, ldraw_lib__stud3(realsolid)],
// 1 16 0 4 0 1 0 0 0 -5 0 0 0 1 stud3.dat
  [1,16,0,4,0,1,0,0,0,-5,0,0,0,1, ldraw_lib__stud3(realsolid)],
// 1 16 20 4 0 1 0 0 0 -5 0 0 0 1 stud3.dat
  [1,16,20,4,0,1,0,0,0,-5,0,0,0,1, ldraw_lib__stud3(realsolid)],
// 4 16 -40 24 -10 40 24 -10 36 24 -6 -36 24 -6
  [4,16,-40,24,-10,40,24,-10,36,24,-6,-36,24,-6],
// 4 16 -40 24 10 -36 24 6 36 24 6 40 24 10
  [4,16,-40,24,10,-36,24,6,36,24,6,40,24,10],
// 4 16 -40 24 -10 -36 24 -6 -36 24 6 -40 24 10
  [4,16,-40,24,-10,-36,24,-6,-36,24,6,-40,24,10],
// 4 16 40 24 -10 40 24 10 36 24 6 36 24 -6
  [4,16,40,24,-10,40,24,10,36,24,6,36,24,-6],
// 0
];
module ldraw_lib__s__3010s01(step=0, col=false, unit=2/5, alt=false, line=0.2, solid=!$preview)
    makepoly(ldraw_lib__s__3010s01(solid), step=step, col=col, unit=unit, alt=alt, line=line, solid=solid);
ldraw_lib__s__3010s01(line=0.2);
// file: ../p/box5-12.scad
use <../lib.scad>
function ldraw_lib__box5_12() = [
// 0 Box with 5 Faces without Any Edges
// 0 Name: box5-12.dat
// 0 Author: Chris Dee [cwdee]
// 0 !LDRAW_ORG Primitive UPDATE 2009-02
// 0 !LICENSE Licensed under CC BY 2.0 and CC BY 4.0 : see CAreadme.txt
// 
// 0 BFC CERTIFY CCW
  [0,"BFC","CERTIFY"],
  [0,"BFC","CCW"],
// 
// 0 !HISTORY 2009-09-03 [PTadmin] Official Update 2009-02
// 
// 
// 4 16 1 1 1 1 1 -1 -1 1 -1 -1 1 1
  [4,16,1,1,1,1,1,-1,-1,1,-1,-1,1,1],
// 4 16 -1 0 1 1 0 1 1 1 1 -1 1 1
  [4,16,-1,0,1,1,0,1,1,1,1,-1,1,1],
// 4 16 -1 0 -1 -1 0 1 -1 1 1 -1 1 -1
  [4,16,-1,0,-1,-1,0,1,-1,1,1,-1,1,-1],
// 4 16 1 0 -1 -1 0 -1 -1 1 -1 1 1 -1
  [4,16,1,0,-1,-1,0,-1,-1,1,-1,1,1,-1],
// 4 16 1 0 1 1 0 -1 1 1 -1 1 1 1
  [4,16,1,0,1,1,0,-1,1,1,-1,1,1,1],
// 0
];
module ldraw_lib__box5_12(step=0, col=false, unit=2/5, alt=false, line=0.2, solid=!$preview)
    makepoly(ldraw_lib__box5_12(), step=step, col=col, unit=unit, alt=alt, line=line, solid=solid);
ldraw_lib__box5_12(line=0.2);
// file: 3010.scad
use <../lib.scad>
use <s/3010s01.scad>
function ldraw_lib__3010() = [
// 0 Brick  1 x  4
// 0 Name: 3010.dat
// 0 Author: James Jessiman
// 0 !LDRAW_ORG Part UPDATE 2025-09
// 0 !LICENSE Licensed under CC BY 4.0 : see CAreadme.txt
// 
// 0 BFC CERTIFY CCW
  [0,"BFC","CERTIFY"],
  [0,"BFC","CCW"],
// 
// 0 !HISTORY 2001-10-26 [PTadmin] Official Update 2001-01
// 0 !HISTORY 2002-05-07 {unknown} BFC Certification
// 0 !HISTORY 2002-06-11 [PTadmin] Official Update 2002-03
// 0 !HISTORY 2002-12-12 [hafhead] New subparted version
// 0 !HISTORY 2003-08-01 [PTadmin] Official Update 2003-02
// 0 !HISTORY 2007-06-06 [PTadmin] Header formatted for Contributor Agreement
// 0 !HISTORY 2008-07-01 [PTadmin] Official Update 2008-01
// 0 !HISTORY 2025-09-27 [OrionP] Changed winding to CCW
// 0 !HISTORY 2025-09-29 [OrionP] Official Update 2025-09
// 
// 1 16 0 0 0 1 0 0 0 1 0 0 0 1 s\3010s01.dat
  [1,16,0,0,0,1,0,0,0,1,0,0,0,1, ldraw_lib__s__3010s01()],
// 4 16 -40 24 -10 40 24 -10 40 0 -10 -40 0 -10
  [4,16,-40,24,-10,40,24,-10,40,0,-10,-40,0,-10],
// 0
];
module ldraw_lib__3010(step=0, col=false, unit=2/5, alt=false, line=0.2, solid=!$preview)
    makepoly(ldraw_lib__3010(), step=step, col=col, unit=unit, alt=alt, line=line, solid=solid);
ldraw_lib__3010(line=0.2);
// file: 191895b.scad
use <../lib.scad>
use <../p/box5-12.scad>
use <s/191895s01.scad>
function ldraw_lib__191895b() = [
// 0 Sticker  0.8 x  2 with White "7720"
// 0 Name: 191895b.dat
// 0 Author: Steffen [Steffen]
// 0 !LDRAW_ORG Part UPDATE 2012-01
// 0 !LICENSE Licensed under CC BY 2.0 and CC BY 4.0 : see CAreadme.txt
// 
// 0 BFC CERTIFY CCW
  [0,"BFC","CERTIFY"],
  [0,"BFC","CCW"],
// 
// 0 !HISTORY 2012-03-30 [PTadmin] Official Update 2012-01
// 
// 
// 1 16 0 -0.25 0 20 0 0 0 0.25 0 0 0 -8 box5-12.dat
  [1,16,0,-0.25,0,20,0,0,0,0.25,0,0,0,-8, ldraw_lib__box5_12()],
// 1 16 0 -0.25 -4.5 0.415 0 0 0 1 0 0 0 0.415 s\191895s01.dat
  [1,16,0,-0.25,-4.5,0.415,0,0,0,1,0,0,0,0.415, ldraw_lib__s__191895s01()],
// 4 16 -20 -0.25 8 -16.6 -0.25 5.46 16.6 -0.25 5.46 20 -0.25 8
  [4,16,-20,-0.25,8,-16.6,-0.25,5.46,16.6,-0.25,5.46,20,-0.25,8],
// 4 16 -16.6 -0.25 5.46 -20 -0.25 8 -20 -0.25 -8 -16.6 -0.25 -7.82
  [4,16,-16.6,-0.25,5.46,-20,-0.25,8,-20,-0.25,-8,-16.6,-0.25,-7.82],
// 4 16 -16.6 -0.25 -7.82 -20 -0.25 -8 20 -0.25 -8 16.6 -0.25 -7.82
  [4,16,-16.6,-0.25,-7.82,-20,-0.25,-8,20,-0.25,-8,16.6,-0.25,-7.82],
// 4 16 20 -0.25 8 16.6 -0.25 5.46 16.6 -0.25 -7.82 20 -0.25 -8
  [4,16,20,-0.25,8,16.6,-0.25,5.46,16.6,-0.25,-7.82,20,-0.25,-8],
// 0
];
module ldraw_lib__191895b(step=0, col=false, unit=2/5, alt=false, line=0.2, solid=!$preview)
    makepoly(ldraw_lib__191895b(), step=step, col=col, unit=unit, alt=alt, line=line, solid=solid);
ldraw_lib__191895b(line=0.2);
// main file
use <../lib.scad>
use <191895b.scad>
use <3010.scad>
function ldraw_lib__3010d0c() = [
// 0 Brick  1 x  4 with White "7720" Sticker
// 0 Name: 3010d0c.dat
// 0 Author: Takeshi Takahashi [RainbowDolphin]
// 0 !LDRAW_ORG Shortcut UPDATE 2024-06
// 0 !LICENSE Licensed under CC BY 4.0 : see CAreadme.txt
// 
// 0 BFC CERTIFY CCW
  [0,"BFC","CERTIFY"],
  [0,"BFC","CCW"],
// 
// 0 !CATEGORY Sticker Shortcut
// 0 !KEYWORDS Bricklink 3010pb010, Diesel locomotive, set 7720, Train
// 
// 0 !HISTORY 2024-07-29 [OrionP] Official Update 2024-06
// 
// 1 16 0 0 0 1 0 0 0 1 0 0 0 1 3010.dat
  [1,16,0,0,0,1,0,0,0,1,0,0,0,1, ldraw_lib__3010()],
// 1 16 0 12 -10 1 0 0 0 0 -1 0 1 0 191895b.dat
  [1,16,0,12,-10,1,0,0,0,0,-1,0,1,0, ldraw_lib__191895b()],
];
module ldraw_lib__3010d0c(step=0, col=false, unit=2/5, alt=false, line=0.2, solid=!$preview)
    makepoly(ldraw_lib__3010d0c(), step=step, col=col, unit=unit, alt=alt, line=line, solid=solid);
ldraw_lib__3010d0c(line=0.2);
